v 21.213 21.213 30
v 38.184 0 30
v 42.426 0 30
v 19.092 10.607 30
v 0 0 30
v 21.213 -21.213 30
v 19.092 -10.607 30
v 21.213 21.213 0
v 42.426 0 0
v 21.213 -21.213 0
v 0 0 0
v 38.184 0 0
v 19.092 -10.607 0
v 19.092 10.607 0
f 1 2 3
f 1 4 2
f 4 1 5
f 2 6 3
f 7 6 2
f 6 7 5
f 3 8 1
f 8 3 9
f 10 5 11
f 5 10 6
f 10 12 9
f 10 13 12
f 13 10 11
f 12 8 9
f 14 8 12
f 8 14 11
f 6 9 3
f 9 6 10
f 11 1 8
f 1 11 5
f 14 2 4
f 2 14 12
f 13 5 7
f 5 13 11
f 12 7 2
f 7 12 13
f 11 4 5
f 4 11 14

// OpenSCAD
rotate([0,0,-90])
rotate([0,-90,0]){
    difference(){
        rotate([-45,0,0]) {
            cube([30, 30, 30]);
        }
        scale([1,0.9,0.5]) {
            rotate([-45,0,0]) {
                cube([30, 30, 30]);
            }
        }
    }
}
